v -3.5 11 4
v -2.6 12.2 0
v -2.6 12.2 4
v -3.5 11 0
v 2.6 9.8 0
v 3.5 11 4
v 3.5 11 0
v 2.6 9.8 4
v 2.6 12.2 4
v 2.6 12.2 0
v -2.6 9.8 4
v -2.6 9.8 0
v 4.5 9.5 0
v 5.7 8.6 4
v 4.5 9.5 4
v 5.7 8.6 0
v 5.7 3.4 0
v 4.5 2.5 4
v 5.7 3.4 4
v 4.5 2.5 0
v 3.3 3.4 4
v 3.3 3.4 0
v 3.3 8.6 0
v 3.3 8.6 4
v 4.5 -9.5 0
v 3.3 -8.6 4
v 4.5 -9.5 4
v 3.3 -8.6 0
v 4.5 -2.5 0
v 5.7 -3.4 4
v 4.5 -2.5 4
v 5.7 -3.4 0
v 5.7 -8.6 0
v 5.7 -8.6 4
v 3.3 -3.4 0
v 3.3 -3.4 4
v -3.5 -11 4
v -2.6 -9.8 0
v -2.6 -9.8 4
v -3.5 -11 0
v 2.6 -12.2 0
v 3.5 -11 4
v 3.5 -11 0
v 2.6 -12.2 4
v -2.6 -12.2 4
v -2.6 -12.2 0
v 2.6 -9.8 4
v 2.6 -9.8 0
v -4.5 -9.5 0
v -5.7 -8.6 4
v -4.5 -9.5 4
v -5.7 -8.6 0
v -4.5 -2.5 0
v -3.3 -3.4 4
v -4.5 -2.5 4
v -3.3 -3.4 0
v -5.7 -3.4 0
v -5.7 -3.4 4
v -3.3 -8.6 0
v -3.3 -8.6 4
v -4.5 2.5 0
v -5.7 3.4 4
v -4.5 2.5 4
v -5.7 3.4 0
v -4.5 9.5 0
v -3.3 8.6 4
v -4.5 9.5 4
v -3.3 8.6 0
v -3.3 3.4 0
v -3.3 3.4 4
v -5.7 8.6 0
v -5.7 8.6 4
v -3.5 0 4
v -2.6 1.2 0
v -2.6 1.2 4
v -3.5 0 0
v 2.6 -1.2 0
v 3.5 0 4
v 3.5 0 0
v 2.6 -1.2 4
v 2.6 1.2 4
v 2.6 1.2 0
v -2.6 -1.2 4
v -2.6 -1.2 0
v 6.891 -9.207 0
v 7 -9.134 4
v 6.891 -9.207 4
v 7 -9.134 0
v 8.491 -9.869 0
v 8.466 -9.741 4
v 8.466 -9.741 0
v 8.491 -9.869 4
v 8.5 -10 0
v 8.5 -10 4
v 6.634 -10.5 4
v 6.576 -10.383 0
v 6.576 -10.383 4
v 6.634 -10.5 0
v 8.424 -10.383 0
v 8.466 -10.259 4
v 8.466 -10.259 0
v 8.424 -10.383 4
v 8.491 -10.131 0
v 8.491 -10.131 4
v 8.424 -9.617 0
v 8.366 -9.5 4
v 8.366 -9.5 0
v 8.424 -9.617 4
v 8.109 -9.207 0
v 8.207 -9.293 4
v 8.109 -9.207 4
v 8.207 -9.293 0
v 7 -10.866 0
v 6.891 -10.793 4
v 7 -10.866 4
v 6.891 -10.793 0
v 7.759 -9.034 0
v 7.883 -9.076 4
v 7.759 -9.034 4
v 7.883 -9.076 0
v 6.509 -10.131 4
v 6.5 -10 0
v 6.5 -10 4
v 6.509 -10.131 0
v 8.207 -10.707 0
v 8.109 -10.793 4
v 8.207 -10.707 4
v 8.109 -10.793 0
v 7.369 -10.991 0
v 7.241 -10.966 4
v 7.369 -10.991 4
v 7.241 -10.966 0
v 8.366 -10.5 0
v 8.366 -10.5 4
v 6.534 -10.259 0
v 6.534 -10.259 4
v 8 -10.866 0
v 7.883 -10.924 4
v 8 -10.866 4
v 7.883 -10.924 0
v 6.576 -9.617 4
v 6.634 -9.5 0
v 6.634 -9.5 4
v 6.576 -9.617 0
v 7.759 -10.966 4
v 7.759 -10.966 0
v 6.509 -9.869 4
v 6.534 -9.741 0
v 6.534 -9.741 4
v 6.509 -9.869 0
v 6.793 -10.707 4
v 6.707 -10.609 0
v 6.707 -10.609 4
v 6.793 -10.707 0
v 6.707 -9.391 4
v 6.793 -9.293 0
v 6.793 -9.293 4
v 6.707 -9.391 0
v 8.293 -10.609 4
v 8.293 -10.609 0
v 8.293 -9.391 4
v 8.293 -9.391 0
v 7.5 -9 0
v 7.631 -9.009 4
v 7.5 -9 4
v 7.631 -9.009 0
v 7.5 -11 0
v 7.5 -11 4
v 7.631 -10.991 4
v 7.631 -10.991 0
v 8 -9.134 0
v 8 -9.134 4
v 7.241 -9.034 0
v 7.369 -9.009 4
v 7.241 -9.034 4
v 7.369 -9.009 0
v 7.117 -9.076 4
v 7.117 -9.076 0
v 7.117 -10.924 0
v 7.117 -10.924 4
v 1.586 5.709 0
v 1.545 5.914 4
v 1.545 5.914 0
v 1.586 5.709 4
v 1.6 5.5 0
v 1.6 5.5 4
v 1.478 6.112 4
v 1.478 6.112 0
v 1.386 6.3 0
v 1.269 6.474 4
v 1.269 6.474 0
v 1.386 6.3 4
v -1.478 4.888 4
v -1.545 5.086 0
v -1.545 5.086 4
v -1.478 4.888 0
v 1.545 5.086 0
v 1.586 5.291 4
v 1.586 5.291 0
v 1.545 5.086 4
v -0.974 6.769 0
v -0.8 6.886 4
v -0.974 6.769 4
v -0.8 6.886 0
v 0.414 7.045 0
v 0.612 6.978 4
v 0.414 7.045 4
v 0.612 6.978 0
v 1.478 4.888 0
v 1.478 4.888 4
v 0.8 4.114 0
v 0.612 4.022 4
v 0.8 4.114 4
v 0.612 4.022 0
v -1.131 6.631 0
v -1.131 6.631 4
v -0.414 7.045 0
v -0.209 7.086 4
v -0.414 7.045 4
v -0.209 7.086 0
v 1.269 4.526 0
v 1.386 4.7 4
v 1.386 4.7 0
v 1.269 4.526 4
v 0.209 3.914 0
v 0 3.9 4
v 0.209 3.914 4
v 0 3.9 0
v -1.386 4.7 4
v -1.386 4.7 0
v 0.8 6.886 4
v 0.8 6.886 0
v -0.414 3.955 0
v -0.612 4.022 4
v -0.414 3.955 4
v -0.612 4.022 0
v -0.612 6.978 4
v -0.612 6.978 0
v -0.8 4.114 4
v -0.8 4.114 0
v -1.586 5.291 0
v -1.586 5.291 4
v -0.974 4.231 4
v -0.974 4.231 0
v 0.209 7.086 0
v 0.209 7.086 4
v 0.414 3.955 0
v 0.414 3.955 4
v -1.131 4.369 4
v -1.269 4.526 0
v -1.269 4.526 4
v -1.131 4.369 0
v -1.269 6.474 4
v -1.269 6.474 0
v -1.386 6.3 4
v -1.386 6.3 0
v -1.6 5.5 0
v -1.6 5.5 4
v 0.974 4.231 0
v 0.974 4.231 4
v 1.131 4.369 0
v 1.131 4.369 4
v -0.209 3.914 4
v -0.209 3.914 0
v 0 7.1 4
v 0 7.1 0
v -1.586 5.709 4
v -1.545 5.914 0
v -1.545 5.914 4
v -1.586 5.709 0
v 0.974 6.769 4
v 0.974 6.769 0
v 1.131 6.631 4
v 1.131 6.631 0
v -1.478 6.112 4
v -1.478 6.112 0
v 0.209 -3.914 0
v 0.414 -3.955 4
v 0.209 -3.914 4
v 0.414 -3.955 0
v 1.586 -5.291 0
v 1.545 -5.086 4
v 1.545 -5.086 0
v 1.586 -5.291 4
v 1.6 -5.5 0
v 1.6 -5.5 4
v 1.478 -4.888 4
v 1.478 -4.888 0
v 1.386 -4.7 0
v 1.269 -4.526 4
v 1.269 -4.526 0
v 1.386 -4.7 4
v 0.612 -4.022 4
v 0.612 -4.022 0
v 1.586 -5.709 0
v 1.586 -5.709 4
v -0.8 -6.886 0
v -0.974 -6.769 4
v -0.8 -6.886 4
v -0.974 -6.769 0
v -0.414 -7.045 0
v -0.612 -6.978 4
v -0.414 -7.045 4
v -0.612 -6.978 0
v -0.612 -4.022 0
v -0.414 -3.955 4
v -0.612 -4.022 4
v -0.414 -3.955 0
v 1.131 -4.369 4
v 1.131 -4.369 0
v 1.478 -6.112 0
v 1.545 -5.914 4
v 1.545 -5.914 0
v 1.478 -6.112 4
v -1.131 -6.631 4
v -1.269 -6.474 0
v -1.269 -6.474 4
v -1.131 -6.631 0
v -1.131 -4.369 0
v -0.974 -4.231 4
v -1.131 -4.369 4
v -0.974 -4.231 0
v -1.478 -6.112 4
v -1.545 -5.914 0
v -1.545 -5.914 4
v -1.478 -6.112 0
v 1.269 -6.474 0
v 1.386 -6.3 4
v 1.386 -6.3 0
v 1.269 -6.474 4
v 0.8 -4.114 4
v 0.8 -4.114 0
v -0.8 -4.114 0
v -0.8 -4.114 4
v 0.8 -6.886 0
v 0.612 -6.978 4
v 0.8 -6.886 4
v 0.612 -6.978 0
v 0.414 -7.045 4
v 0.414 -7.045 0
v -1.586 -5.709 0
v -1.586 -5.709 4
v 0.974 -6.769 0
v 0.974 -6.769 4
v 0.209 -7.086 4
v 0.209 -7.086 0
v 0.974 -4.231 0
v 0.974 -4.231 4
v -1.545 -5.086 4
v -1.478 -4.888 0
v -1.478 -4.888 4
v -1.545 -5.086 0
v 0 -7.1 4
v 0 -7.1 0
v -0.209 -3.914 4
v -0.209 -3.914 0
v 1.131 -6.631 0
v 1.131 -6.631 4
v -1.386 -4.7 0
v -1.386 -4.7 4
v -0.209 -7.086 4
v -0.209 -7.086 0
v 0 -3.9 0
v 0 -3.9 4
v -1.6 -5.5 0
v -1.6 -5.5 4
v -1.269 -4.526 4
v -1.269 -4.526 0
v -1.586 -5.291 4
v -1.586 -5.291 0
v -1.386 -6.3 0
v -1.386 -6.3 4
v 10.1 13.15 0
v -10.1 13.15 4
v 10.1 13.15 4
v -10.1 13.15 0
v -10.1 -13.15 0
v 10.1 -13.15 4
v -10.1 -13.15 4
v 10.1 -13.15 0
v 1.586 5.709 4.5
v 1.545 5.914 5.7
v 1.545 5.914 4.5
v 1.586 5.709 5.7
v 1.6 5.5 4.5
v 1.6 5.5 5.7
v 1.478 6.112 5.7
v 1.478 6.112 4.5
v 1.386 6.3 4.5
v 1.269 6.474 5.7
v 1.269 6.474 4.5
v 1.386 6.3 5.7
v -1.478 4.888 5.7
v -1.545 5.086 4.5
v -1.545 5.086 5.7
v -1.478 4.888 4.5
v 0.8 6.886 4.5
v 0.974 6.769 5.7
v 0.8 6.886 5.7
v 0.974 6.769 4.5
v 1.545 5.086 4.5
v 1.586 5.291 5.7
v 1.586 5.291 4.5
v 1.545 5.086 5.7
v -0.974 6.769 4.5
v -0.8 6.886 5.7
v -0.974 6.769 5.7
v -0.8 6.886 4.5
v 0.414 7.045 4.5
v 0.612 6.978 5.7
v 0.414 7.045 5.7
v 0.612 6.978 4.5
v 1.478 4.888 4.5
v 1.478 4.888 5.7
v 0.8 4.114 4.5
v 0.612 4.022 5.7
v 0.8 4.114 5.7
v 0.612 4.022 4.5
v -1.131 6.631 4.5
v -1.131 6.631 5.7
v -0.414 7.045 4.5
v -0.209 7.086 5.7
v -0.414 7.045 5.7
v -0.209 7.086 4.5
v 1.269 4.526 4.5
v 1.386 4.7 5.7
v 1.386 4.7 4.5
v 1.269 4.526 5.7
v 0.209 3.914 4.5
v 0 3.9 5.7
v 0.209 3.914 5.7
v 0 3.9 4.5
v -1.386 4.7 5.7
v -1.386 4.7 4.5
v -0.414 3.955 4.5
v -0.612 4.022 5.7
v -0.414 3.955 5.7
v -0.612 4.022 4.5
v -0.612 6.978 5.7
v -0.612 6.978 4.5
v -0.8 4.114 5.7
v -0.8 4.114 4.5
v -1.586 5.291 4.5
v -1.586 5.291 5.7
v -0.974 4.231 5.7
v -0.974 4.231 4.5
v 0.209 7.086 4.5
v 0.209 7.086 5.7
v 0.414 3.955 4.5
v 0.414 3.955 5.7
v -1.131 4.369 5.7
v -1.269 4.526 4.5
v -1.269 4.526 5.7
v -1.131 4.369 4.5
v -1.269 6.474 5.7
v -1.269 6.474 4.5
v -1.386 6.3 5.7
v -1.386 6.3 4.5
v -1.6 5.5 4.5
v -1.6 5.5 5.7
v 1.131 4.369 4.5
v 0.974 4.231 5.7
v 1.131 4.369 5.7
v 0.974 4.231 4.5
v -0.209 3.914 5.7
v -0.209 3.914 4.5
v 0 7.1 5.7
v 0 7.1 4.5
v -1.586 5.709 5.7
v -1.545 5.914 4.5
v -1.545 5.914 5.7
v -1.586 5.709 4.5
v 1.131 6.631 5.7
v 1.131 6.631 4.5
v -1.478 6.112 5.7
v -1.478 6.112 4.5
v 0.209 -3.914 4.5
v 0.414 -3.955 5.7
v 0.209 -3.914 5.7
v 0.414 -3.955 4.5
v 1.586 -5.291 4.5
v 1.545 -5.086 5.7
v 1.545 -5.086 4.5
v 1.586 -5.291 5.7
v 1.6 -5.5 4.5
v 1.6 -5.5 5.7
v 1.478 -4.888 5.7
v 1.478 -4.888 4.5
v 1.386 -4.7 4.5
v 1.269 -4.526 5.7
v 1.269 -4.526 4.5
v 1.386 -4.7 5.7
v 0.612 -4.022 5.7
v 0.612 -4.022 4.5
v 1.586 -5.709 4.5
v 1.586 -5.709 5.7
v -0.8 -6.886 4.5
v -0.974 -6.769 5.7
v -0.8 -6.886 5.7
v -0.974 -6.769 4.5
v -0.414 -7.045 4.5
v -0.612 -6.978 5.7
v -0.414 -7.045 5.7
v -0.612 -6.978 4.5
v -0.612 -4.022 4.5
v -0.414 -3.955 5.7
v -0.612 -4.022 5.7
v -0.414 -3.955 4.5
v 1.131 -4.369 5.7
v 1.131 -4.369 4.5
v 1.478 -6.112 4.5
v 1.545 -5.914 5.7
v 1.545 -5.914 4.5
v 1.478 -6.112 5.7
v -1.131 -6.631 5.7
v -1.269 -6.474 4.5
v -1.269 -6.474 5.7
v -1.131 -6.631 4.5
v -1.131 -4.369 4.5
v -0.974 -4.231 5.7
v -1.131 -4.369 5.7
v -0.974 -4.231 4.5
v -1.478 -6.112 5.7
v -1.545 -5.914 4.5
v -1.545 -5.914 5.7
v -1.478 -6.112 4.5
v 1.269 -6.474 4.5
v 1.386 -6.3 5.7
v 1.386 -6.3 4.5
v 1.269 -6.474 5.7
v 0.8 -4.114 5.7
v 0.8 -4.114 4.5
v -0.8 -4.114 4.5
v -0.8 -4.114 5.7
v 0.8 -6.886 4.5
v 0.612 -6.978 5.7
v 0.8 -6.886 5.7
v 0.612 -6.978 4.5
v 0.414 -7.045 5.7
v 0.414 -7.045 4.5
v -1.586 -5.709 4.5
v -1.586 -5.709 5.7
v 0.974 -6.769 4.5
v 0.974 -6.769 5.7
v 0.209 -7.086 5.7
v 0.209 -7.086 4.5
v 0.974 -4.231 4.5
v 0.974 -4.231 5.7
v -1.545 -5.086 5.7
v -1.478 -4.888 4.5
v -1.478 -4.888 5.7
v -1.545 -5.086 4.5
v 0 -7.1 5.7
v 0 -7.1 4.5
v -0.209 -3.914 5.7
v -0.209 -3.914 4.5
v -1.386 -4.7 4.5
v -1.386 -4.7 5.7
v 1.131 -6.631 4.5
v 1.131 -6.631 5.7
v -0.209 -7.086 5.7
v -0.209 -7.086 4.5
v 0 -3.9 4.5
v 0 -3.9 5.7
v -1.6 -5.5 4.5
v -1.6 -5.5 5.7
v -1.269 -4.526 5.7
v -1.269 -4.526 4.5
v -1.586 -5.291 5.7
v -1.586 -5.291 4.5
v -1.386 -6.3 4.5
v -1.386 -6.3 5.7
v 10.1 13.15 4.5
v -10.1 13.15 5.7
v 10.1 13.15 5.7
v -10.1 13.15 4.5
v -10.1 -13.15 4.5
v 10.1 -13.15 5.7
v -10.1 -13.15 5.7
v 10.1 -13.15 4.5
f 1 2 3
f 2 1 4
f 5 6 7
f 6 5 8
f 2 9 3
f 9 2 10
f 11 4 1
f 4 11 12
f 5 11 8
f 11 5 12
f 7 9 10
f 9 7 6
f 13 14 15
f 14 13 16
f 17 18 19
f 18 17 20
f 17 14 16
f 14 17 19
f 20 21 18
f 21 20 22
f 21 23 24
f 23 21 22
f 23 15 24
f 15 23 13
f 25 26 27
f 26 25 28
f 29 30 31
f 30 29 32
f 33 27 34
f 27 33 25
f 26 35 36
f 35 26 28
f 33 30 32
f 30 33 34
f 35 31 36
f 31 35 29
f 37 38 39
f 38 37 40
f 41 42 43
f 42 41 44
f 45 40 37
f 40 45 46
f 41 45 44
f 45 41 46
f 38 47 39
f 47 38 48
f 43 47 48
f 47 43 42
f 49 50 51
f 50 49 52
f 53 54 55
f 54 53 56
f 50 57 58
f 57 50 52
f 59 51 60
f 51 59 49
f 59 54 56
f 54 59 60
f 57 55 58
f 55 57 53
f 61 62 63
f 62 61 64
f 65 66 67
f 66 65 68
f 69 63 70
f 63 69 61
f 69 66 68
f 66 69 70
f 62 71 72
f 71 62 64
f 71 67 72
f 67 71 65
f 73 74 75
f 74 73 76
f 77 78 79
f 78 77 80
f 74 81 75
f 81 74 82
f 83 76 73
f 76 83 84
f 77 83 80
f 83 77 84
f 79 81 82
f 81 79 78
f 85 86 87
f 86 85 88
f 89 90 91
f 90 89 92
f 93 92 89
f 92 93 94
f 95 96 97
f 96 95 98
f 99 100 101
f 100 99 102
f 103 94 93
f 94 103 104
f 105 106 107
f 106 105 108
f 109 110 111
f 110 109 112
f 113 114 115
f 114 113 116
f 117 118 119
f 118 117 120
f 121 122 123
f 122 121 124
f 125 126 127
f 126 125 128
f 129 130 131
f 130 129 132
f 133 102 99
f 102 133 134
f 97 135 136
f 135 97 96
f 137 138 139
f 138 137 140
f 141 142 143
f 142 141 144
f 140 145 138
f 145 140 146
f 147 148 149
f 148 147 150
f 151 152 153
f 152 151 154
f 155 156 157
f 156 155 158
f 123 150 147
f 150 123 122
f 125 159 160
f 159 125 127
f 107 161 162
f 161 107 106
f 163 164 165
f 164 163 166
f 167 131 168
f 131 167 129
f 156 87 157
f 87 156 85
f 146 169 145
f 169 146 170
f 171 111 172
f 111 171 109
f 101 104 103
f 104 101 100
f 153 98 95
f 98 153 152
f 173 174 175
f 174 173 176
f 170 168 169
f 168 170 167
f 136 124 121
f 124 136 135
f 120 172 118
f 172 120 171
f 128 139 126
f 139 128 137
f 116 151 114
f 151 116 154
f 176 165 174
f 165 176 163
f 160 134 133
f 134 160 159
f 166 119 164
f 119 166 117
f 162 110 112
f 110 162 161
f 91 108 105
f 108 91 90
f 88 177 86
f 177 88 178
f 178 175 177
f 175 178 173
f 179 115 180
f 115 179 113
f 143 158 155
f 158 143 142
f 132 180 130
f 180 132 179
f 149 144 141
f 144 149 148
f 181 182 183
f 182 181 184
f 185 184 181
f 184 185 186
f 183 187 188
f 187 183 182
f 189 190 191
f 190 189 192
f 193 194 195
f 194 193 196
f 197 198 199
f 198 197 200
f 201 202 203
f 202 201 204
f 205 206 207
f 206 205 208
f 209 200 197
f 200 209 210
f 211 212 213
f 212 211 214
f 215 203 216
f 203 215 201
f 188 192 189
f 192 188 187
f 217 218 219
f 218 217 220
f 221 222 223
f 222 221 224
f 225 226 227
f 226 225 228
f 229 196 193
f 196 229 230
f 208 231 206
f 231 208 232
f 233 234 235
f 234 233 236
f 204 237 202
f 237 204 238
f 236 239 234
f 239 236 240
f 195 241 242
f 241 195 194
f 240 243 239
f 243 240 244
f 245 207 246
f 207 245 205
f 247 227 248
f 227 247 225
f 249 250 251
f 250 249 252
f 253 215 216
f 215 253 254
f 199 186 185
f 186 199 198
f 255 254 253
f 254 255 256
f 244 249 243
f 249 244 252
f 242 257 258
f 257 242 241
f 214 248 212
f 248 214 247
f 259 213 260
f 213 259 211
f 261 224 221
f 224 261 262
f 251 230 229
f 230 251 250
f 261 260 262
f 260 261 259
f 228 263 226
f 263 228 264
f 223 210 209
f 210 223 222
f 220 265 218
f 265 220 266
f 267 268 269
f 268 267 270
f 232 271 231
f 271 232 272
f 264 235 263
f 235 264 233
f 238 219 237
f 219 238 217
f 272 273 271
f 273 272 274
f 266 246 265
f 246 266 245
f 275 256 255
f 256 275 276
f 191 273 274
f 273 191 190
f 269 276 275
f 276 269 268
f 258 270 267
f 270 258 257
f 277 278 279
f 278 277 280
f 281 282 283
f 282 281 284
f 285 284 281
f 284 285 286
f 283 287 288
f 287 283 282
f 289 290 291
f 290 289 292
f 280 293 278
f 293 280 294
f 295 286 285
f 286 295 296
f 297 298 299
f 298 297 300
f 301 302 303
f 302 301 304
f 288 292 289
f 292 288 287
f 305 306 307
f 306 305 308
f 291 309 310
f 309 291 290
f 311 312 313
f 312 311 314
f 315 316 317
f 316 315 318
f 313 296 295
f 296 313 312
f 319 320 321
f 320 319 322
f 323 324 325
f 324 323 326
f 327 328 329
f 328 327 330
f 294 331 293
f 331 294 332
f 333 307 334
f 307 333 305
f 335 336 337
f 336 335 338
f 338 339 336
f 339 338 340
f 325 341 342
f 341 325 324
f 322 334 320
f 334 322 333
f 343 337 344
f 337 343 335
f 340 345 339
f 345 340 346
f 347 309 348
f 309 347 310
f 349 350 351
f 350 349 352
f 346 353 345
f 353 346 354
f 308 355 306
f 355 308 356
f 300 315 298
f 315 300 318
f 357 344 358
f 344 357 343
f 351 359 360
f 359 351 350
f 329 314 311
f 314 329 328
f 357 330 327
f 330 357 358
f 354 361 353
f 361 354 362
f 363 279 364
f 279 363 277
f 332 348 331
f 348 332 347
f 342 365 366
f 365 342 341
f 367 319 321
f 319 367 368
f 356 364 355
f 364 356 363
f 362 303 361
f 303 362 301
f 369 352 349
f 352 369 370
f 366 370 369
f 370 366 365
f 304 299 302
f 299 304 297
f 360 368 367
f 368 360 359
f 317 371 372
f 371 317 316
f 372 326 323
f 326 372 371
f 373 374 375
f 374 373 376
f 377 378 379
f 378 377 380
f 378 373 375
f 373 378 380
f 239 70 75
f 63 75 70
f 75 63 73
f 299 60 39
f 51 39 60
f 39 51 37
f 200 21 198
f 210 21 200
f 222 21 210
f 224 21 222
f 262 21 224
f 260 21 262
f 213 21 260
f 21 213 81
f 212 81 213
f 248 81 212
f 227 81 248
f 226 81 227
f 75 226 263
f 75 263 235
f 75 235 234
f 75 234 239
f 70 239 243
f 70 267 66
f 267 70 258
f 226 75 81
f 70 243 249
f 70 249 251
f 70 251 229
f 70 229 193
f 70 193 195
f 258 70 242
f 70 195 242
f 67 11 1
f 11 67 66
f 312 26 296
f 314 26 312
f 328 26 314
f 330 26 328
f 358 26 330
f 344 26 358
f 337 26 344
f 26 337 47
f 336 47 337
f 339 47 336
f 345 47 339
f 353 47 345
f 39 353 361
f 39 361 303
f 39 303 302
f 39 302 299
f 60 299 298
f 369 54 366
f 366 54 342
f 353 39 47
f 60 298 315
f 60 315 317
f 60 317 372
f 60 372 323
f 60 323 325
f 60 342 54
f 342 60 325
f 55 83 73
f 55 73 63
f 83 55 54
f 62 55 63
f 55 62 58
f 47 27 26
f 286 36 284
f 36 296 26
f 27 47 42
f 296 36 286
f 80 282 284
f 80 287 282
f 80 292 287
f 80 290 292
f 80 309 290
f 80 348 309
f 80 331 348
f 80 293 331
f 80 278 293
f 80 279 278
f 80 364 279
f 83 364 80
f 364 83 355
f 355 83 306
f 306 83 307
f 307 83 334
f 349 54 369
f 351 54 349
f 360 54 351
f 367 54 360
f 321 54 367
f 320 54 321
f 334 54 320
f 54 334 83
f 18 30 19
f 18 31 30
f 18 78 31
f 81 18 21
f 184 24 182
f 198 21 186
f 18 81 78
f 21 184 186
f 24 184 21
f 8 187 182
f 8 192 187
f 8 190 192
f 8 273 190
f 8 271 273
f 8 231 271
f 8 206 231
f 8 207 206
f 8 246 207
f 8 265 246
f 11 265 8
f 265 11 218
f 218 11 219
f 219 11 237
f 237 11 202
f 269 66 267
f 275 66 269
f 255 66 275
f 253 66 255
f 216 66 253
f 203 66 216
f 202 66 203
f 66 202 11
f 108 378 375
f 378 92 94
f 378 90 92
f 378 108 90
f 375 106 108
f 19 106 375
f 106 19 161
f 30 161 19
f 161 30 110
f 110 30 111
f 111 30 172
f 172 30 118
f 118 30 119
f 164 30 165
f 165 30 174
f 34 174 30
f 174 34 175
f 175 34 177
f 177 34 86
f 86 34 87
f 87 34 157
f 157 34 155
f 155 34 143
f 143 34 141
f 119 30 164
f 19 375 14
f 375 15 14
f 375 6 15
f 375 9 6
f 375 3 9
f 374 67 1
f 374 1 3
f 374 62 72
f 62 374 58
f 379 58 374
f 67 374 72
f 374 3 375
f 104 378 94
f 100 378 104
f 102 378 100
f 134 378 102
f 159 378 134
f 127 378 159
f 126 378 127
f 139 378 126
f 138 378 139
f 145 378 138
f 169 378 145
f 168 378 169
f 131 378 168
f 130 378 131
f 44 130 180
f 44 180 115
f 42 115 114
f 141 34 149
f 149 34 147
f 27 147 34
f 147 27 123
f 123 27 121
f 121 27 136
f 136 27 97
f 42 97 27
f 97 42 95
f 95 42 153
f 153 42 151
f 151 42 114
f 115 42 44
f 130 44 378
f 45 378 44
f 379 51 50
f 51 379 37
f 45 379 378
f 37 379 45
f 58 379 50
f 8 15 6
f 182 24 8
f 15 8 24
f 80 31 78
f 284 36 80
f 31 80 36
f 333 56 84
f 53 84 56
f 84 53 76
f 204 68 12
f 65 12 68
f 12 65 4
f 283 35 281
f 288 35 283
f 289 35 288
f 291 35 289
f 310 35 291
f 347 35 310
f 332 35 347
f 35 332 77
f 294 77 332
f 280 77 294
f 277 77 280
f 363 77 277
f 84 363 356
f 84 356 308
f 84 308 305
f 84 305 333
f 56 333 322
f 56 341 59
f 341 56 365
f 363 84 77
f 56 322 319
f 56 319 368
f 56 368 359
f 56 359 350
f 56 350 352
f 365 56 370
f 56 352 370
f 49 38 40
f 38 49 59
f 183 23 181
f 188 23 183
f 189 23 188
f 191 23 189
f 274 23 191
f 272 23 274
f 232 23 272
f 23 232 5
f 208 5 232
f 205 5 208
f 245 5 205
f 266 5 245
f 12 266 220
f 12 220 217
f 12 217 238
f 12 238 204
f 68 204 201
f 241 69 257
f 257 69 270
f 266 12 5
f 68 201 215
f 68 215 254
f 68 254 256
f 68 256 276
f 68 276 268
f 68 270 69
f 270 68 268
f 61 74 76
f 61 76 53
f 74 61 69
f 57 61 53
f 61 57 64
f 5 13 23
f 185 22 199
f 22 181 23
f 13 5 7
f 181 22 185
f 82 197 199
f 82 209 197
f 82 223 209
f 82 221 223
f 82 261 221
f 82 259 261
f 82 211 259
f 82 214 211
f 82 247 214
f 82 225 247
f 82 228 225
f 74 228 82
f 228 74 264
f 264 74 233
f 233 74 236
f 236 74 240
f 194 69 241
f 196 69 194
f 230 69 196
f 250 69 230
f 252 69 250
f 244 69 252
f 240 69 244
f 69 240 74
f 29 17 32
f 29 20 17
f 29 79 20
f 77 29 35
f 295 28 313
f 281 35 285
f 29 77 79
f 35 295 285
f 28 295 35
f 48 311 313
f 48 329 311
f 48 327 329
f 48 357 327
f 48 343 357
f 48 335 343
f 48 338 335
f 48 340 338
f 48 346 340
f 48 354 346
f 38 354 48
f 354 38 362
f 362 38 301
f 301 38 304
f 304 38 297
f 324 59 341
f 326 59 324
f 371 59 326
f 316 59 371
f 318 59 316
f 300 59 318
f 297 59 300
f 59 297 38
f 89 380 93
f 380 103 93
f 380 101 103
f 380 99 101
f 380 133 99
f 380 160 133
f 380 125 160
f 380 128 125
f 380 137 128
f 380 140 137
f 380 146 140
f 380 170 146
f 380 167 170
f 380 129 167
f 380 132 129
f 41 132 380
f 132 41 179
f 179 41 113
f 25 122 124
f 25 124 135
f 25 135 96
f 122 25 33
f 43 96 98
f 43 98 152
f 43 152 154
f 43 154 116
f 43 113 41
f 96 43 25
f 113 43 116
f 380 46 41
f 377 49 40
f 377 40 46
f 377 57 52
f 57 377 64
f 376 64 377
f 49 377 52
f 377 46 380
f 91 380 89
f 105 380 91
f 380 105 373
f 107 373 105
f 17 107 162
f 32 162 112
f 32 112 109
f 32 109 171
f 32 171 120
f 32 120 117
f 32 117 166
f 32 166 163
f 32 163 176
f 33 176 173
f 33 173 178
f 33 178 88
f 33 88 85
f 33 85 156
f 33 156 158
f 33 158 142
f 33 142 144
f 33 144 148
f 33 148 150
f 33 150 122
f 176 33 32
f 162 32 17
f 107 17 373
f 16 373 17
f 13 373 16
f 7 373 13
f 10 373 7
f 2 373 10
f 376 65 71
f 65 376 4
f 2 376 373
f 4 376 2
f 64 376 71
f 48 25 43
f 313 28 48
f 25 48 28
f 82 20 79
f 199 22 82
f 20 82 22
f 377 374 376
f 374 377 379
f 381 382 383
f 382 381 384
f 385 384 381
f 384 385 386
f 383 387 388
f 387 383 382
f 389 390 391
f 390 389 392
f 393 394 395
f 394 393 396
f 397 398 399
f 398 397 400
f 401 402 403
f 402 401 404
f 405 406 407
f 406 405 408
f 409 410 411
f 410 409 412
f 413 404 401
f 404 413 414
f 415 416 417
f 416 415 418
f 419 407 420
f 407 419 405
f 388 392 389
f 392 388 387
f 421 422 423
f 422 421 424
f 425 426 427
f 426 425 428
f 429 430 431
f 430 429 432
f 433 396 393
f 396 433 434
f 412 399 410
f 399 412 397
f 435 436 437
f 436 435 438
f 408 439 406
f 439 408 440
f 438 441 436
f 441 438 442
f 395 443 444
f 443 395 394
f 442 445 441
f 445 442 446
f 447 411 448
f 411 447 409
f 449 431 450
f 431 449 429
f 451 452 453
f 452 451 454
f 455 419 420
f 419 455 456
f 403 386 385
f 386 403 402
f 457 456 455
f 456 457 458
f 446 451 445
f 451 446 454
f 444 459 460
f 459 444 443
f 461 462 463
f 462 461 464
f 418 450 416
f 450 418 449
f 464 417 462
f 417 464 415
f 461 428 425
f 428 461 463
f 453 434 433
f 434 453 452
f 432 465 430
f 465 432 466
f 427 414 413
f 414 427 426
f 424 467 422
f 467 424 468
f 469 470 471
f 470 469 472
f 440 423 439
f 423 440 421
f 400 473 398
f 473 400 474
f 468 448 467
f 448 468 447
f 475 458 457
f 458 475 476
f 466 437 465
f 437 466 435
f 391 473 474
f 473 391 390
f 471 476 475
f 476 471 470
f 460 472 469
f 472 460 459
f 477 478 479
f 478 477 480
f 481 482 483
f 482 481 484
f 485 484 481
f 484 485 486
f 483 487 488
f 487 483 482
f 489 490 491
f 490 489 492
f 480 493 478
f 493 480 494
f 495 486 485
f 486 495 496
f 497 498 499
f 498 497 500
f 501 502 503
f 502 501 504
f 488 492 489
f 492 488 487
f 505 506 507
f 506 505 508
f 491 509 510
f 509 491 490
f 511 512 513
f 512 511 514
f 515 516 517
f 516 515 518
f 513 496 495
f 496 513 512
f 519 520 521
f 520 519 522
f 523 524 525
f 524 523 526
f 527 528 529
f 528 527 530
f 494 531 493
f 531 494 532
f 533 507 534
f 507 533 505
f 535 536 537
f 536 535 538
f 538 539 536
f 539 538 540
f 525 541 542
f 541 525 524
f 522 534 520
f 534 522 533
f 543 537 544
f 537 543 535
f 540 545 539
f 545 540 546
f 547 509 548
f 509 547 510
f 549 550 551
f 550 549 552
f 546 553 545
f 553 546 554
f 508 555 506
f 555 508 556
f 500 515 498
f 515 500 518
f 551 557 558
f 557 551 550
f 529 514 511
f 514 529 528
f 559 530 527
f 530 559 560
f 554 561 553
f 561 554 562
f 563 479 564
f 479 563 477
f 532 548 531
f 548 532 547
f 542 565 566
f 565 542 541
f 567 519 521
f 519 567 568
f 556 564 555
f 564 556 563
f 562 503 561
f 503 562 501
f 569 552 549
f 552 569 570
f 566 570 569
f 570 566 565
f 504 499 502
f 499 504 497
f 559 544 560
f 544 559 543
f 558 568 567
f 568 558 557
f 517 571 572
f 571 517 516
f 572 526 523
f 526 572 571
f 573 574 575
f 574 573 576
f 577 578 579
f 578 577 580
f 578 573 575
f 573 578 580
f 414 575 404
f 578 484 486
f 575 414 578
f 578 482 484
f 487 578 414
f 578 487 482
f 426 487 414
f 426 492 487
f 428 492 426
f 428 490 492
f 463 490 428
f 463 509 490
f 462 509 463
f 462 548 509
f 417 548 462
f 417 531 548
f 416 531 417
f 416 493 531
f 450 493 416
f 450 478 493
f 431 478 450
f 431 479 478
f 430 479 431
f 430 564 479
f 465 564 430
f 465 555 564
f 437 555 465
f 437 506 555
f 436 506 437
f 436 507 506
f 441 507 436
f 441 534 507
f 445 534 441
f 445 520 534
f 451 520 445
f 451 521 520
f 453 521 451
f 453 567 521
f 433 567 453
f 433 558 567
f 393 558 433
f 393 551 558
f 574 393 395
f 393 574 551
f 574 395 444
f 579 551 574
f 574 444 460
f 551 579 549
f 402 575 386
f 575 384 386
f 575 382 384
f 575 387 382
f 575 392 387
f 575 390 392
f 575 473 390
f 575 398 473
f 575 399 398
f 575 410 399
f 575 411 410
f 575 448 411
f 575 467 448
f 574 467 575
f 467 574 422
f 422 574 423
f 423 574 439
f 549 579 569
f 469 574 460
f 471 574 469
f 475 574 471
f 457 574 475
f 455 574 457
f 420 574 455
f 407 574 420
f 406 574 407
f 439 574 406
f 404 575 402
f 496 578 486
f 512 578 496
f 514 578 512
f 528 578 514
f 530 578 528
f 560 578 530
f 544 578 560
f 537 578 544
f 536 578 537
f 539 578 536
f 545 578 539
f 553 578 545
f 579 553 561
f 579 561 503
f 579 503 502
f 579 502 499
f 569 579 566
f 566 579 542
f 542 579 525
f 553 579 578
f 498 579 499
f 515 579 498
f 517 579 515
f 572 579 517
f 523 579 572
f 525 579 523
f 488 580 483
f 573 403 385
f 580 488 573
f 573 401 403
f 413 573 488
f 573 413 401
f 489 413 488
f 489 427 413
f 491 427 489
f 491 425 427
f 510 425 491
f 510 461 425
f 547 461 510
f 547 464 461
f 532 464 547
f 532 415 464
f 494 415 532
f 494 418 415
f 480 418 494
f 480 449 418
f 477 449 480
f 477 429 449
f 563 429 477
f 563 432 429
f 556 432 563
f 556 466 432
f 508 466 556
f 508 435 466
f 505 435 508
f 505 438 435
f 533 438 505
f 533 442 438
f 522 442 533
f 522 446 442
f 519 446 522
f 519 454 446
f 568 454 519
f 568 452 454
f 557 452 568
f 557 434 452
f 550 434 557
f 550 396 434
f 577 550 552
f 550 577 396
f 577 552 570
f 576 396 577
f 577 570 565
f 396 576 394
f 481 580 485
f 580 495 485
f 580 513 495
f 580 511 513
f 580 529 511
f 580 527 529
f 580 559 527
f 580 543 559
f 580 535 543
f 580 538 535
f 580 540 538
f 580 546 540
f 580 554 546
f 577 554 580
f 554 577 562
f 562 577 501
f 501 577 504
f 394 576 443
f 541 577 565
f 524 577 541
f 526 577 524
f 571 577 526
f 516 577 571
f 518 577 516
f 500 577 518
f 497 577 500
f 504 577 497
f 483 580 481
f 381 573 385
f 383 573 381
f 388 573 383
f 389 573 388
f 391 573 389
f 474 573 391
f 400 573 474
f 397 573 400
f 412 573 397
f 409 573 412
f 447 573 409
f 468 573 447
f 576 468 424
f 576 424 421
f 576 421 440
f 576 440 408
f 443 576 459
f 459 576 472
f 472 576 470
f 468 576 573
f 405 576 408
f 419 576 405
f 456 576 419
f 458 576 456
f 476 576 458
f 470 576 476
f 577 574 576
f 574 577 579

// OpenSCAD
// =============================================================================
// mini7seg_diffuser.scad
// Parametric LED diffuser/baffle overlay for the mcyork/mini7seg PCB.
//
// PURPOSE
//   The mini7seg PCB places one WS2812B-2020 LED behind each of seven hex-bar
//   segments + a round DP. To make it look like a traditional 7-segment digit,
//   we want two stacked layers above the board:
//
//     Layer 2  ┌──────────────────────────────┐  diffuser (translucent)
//              │   light-spreading flat cap   │
//     Layer 1  ├──┬──┬──┬──┬──┬──┬──┬──┬──┬──┤  baffle (opaque)
//              │  │A │B │C │D │E │F │G │·│  │   hex tubes that contain each
//              │  └──┴──┴──┴──┴──┴──┴──┴─┴──┘   LED's light, no neighbor bleed
//     PCB      [   board with 8 LEDs                                  ]
//
//   Print baffle in opaque filament (black/dark grey).
//   Print diffuser in translucent / natural / white-translucent filament,
//   ~0.8–1.2 mm thick, low infill, "vase mode" or 100% infill both work.
//
// LAYOUT REFERENCE
//   See ../images/pcb-design.png. Outer board 20.2 × 34.3 mm.
//   Segments are elongated hexagons. Two through-holes (C1, C2). 3-pin
//   headers H1 (top) and H2 (bottom) for daisy-chain. DP near bottom-right.
//
// DISCLAIMER
//   Segment XY positions and the mounting-hole Y values below are derived
//   from the PCB design image, not from the actual gerbers. Print baffle v1,
//   set it on the board, and tweak the seg_*_pos / mount_hole_y_* / dp_pos
//   numbers if anything is off. All offsets in millimeters, board-frame
//   origin = geometric center of the PCB, +X = right, +Y = up.
// =============================================================================


// ---------- BOARD ----------
board_w        = 20.2;     // PCB width  (X)
board_h        = 34.3;     // PCB height (Y)
header_zone_top = 4.0;     // clearance for H1 connector at top edge
header_zone_bot = 4.0;     // clearance for H2 connector at bottom edge

// Mounting holes (C1, C2 on the silk). Diameters from typical M3 clearance.
mount_hole_d        = 3.2;
mount_hole_y_top    =  5.5;   // C1 — adjust after measuring
mount_hole_y_bot    = -5.5;   // C2 — adjust after measuring


// ---------- SEGMENT GEOMETRY (one hex-bar) ----------
// Six-sided elongated hexagon: a rectangle with both ends pointed.
seg_length  = 7.0;     // long axis (tip to tip)
seg_width   = 2.4;     // short axis (across the bar)
seg_chamfer = 0.9;     // length of the pointed end region


// ---------- DIGIT LAYOUT ----------
// [x_center, y_center, rotation_deg]. Rotation 0 = horizontal bar (long axis on X).
seg_A = [ 0,    11.0,   0];   // top
seg_B = [ 4.5,  6.0,   90];   // top-right
seg_C = [ 4.5, -6.0,   90];   // bottom-right
seg_D = [ 0,   -11.0,   0];   // bottom
seg_E = [-4.5, -6.0,   90];   // bottom-left
seg_F = [-4.5,  6.0,   90];   // top-left
seg_G = [ 0,    0.0,    0];   // middle

// Decimal point — round LED at lower-right
dp_pos = [ 7.5, -10.0];
dp_d   = 2.0;


// ---------- BAFFLE ----------
baffle_thickness = 4.0;    // tube height; tweak per LED dome height + headroom
wall_min         = 0.8;    // visual reference; not enforced — set seg dims to respect this


// ---------- DIFFUSER ----------
diffuser_thickness = 1.2;
diffuser_overhang  = 0.5;  // extends past PCB edges by this much


// ---------- RENDER MODE ----------
// One of: "baffle", "diffuser", "preview"
mode = "preview";


// =============================================================================
// MODULES
// =============================================================================

// Elongated hex (6 vertices), centered at origin, long axis on X.
module hex_bar(length, width, chamfer) {
    polygon(points = [
        [-length/2 + chamfer, -width/2],
        [ length/2 - chamfer, -width/2],
        [ length/2,            0      ],
        [ length/2 - chamfer,  width/2],
        [-length/2 + chamfer,  width/2],
        [-length/2,            0      ],
    ]);
}

// Place a hex pocket at the given segment position
module hex_pocket(seg, h) {
    translate([seg[0], seg[1], 0])
        rotate([0, 0, seg[2]])
            linear_extrude(height = h)
                hex_bar(seg_length, seg_width, seg_chamfer);
}

module dp_pocket(h) {
    translate([dp_pos[0], dp_pos[1], 0])
        cylinder(d = dp_d, h = h, $fn = 48);
}

module mounting_hole(y, h) {
    translate([0, y, 0])
        cylinder(d = mount_hole_d, h = h, $fn = 48);
}

module header_cutout_top(h) {
    translate([-board_w/2 - 0.1, board_h/2 - header_zone_top, 0])
        cube([board_w + 0.2, header_zone_top + 0.1, h]);
}

module header_cutout_bot(h) {
    translate([-board_w/2 - 0.1, -board_h/2 - 0.1, 0])
        cube([board_w + 0.2, header_zone_bot + 0.1, h]);
}

module baffle() {
    difference() {
        // solid plate the size of the PCB
        translate([-board_w/2, -board_h/2, 0])
            cube([board_w, board_h, baffle_thickness]);

        // subtract segment pockets (slight Z over-cut for clean rendering)
        translate([0, 0, -0.05]) {
            hex_pocket(seg_A, baffle_thickness + 0.1);
            hex_pocket(seg_B, baffle_thickness + 0.1);
            hex_pocket(seg_C, baffle_thickness + 0.1);
            hex_pocket(seg_D, baffle_thickness + 0.1);
            hex_pocket(seg_E, baffle_thickness + 0.1);
            hex_pocket(seg_F, baffle_thickness + 0.1);
            hex_pocket(seg_G, baffle_thickness + 0.1);
            dp_pocket(baffle_thickness + 0.1);

            mounting_hole(mount_hole_y_top, baffle_thickness + 0.1);
            mounting_hole(mount_hole_y_bot, baffle_thickness + 0.1);

            header_cutout_top(baffle_thickness + 0.1);
            header_cutout_bot(baffle_thickness + 0.1);
        }
    }
}

module diffuser() {
    // Same outer profile as the baffle (so it stacks cleanly), with the same
    // mount-hole + header-cutout pattern punched through. No segment pockets —
    // this layer is a continuous sheet that lets light through from below.
    difference() {
        translate([-board_w/2, -board_h/2, 0])
            cube([board_w, board_h, diffuser_thickness]);

        translate([0, 0, -0.05]) {
            mounting_hole(mount_hole_y_top, diffuser_thickness + 0.1);
            mounting_hole(mount_hole_y_bot, diffuser_thickness + 0.1);
            header_cutout_top(diffuser_thickness + 0.1);
            header_cutout_bot(diffuser_thickness + 0.1);
        }
    }
}


// =============================================================================
// RENDER
// =============================================================================

if (mode == "baffle") {
    baffle();
} else if (mode == "diffuser") {
    diffuser();
} else {
    // preview: baffle + translucent diffuser floating above so you can see
    // the tube structure
    baffle();
    color([1, 1, 1, 0.35])
        translate([0, 0, baffle_thickness + 0.5])
            diffuser();
}
